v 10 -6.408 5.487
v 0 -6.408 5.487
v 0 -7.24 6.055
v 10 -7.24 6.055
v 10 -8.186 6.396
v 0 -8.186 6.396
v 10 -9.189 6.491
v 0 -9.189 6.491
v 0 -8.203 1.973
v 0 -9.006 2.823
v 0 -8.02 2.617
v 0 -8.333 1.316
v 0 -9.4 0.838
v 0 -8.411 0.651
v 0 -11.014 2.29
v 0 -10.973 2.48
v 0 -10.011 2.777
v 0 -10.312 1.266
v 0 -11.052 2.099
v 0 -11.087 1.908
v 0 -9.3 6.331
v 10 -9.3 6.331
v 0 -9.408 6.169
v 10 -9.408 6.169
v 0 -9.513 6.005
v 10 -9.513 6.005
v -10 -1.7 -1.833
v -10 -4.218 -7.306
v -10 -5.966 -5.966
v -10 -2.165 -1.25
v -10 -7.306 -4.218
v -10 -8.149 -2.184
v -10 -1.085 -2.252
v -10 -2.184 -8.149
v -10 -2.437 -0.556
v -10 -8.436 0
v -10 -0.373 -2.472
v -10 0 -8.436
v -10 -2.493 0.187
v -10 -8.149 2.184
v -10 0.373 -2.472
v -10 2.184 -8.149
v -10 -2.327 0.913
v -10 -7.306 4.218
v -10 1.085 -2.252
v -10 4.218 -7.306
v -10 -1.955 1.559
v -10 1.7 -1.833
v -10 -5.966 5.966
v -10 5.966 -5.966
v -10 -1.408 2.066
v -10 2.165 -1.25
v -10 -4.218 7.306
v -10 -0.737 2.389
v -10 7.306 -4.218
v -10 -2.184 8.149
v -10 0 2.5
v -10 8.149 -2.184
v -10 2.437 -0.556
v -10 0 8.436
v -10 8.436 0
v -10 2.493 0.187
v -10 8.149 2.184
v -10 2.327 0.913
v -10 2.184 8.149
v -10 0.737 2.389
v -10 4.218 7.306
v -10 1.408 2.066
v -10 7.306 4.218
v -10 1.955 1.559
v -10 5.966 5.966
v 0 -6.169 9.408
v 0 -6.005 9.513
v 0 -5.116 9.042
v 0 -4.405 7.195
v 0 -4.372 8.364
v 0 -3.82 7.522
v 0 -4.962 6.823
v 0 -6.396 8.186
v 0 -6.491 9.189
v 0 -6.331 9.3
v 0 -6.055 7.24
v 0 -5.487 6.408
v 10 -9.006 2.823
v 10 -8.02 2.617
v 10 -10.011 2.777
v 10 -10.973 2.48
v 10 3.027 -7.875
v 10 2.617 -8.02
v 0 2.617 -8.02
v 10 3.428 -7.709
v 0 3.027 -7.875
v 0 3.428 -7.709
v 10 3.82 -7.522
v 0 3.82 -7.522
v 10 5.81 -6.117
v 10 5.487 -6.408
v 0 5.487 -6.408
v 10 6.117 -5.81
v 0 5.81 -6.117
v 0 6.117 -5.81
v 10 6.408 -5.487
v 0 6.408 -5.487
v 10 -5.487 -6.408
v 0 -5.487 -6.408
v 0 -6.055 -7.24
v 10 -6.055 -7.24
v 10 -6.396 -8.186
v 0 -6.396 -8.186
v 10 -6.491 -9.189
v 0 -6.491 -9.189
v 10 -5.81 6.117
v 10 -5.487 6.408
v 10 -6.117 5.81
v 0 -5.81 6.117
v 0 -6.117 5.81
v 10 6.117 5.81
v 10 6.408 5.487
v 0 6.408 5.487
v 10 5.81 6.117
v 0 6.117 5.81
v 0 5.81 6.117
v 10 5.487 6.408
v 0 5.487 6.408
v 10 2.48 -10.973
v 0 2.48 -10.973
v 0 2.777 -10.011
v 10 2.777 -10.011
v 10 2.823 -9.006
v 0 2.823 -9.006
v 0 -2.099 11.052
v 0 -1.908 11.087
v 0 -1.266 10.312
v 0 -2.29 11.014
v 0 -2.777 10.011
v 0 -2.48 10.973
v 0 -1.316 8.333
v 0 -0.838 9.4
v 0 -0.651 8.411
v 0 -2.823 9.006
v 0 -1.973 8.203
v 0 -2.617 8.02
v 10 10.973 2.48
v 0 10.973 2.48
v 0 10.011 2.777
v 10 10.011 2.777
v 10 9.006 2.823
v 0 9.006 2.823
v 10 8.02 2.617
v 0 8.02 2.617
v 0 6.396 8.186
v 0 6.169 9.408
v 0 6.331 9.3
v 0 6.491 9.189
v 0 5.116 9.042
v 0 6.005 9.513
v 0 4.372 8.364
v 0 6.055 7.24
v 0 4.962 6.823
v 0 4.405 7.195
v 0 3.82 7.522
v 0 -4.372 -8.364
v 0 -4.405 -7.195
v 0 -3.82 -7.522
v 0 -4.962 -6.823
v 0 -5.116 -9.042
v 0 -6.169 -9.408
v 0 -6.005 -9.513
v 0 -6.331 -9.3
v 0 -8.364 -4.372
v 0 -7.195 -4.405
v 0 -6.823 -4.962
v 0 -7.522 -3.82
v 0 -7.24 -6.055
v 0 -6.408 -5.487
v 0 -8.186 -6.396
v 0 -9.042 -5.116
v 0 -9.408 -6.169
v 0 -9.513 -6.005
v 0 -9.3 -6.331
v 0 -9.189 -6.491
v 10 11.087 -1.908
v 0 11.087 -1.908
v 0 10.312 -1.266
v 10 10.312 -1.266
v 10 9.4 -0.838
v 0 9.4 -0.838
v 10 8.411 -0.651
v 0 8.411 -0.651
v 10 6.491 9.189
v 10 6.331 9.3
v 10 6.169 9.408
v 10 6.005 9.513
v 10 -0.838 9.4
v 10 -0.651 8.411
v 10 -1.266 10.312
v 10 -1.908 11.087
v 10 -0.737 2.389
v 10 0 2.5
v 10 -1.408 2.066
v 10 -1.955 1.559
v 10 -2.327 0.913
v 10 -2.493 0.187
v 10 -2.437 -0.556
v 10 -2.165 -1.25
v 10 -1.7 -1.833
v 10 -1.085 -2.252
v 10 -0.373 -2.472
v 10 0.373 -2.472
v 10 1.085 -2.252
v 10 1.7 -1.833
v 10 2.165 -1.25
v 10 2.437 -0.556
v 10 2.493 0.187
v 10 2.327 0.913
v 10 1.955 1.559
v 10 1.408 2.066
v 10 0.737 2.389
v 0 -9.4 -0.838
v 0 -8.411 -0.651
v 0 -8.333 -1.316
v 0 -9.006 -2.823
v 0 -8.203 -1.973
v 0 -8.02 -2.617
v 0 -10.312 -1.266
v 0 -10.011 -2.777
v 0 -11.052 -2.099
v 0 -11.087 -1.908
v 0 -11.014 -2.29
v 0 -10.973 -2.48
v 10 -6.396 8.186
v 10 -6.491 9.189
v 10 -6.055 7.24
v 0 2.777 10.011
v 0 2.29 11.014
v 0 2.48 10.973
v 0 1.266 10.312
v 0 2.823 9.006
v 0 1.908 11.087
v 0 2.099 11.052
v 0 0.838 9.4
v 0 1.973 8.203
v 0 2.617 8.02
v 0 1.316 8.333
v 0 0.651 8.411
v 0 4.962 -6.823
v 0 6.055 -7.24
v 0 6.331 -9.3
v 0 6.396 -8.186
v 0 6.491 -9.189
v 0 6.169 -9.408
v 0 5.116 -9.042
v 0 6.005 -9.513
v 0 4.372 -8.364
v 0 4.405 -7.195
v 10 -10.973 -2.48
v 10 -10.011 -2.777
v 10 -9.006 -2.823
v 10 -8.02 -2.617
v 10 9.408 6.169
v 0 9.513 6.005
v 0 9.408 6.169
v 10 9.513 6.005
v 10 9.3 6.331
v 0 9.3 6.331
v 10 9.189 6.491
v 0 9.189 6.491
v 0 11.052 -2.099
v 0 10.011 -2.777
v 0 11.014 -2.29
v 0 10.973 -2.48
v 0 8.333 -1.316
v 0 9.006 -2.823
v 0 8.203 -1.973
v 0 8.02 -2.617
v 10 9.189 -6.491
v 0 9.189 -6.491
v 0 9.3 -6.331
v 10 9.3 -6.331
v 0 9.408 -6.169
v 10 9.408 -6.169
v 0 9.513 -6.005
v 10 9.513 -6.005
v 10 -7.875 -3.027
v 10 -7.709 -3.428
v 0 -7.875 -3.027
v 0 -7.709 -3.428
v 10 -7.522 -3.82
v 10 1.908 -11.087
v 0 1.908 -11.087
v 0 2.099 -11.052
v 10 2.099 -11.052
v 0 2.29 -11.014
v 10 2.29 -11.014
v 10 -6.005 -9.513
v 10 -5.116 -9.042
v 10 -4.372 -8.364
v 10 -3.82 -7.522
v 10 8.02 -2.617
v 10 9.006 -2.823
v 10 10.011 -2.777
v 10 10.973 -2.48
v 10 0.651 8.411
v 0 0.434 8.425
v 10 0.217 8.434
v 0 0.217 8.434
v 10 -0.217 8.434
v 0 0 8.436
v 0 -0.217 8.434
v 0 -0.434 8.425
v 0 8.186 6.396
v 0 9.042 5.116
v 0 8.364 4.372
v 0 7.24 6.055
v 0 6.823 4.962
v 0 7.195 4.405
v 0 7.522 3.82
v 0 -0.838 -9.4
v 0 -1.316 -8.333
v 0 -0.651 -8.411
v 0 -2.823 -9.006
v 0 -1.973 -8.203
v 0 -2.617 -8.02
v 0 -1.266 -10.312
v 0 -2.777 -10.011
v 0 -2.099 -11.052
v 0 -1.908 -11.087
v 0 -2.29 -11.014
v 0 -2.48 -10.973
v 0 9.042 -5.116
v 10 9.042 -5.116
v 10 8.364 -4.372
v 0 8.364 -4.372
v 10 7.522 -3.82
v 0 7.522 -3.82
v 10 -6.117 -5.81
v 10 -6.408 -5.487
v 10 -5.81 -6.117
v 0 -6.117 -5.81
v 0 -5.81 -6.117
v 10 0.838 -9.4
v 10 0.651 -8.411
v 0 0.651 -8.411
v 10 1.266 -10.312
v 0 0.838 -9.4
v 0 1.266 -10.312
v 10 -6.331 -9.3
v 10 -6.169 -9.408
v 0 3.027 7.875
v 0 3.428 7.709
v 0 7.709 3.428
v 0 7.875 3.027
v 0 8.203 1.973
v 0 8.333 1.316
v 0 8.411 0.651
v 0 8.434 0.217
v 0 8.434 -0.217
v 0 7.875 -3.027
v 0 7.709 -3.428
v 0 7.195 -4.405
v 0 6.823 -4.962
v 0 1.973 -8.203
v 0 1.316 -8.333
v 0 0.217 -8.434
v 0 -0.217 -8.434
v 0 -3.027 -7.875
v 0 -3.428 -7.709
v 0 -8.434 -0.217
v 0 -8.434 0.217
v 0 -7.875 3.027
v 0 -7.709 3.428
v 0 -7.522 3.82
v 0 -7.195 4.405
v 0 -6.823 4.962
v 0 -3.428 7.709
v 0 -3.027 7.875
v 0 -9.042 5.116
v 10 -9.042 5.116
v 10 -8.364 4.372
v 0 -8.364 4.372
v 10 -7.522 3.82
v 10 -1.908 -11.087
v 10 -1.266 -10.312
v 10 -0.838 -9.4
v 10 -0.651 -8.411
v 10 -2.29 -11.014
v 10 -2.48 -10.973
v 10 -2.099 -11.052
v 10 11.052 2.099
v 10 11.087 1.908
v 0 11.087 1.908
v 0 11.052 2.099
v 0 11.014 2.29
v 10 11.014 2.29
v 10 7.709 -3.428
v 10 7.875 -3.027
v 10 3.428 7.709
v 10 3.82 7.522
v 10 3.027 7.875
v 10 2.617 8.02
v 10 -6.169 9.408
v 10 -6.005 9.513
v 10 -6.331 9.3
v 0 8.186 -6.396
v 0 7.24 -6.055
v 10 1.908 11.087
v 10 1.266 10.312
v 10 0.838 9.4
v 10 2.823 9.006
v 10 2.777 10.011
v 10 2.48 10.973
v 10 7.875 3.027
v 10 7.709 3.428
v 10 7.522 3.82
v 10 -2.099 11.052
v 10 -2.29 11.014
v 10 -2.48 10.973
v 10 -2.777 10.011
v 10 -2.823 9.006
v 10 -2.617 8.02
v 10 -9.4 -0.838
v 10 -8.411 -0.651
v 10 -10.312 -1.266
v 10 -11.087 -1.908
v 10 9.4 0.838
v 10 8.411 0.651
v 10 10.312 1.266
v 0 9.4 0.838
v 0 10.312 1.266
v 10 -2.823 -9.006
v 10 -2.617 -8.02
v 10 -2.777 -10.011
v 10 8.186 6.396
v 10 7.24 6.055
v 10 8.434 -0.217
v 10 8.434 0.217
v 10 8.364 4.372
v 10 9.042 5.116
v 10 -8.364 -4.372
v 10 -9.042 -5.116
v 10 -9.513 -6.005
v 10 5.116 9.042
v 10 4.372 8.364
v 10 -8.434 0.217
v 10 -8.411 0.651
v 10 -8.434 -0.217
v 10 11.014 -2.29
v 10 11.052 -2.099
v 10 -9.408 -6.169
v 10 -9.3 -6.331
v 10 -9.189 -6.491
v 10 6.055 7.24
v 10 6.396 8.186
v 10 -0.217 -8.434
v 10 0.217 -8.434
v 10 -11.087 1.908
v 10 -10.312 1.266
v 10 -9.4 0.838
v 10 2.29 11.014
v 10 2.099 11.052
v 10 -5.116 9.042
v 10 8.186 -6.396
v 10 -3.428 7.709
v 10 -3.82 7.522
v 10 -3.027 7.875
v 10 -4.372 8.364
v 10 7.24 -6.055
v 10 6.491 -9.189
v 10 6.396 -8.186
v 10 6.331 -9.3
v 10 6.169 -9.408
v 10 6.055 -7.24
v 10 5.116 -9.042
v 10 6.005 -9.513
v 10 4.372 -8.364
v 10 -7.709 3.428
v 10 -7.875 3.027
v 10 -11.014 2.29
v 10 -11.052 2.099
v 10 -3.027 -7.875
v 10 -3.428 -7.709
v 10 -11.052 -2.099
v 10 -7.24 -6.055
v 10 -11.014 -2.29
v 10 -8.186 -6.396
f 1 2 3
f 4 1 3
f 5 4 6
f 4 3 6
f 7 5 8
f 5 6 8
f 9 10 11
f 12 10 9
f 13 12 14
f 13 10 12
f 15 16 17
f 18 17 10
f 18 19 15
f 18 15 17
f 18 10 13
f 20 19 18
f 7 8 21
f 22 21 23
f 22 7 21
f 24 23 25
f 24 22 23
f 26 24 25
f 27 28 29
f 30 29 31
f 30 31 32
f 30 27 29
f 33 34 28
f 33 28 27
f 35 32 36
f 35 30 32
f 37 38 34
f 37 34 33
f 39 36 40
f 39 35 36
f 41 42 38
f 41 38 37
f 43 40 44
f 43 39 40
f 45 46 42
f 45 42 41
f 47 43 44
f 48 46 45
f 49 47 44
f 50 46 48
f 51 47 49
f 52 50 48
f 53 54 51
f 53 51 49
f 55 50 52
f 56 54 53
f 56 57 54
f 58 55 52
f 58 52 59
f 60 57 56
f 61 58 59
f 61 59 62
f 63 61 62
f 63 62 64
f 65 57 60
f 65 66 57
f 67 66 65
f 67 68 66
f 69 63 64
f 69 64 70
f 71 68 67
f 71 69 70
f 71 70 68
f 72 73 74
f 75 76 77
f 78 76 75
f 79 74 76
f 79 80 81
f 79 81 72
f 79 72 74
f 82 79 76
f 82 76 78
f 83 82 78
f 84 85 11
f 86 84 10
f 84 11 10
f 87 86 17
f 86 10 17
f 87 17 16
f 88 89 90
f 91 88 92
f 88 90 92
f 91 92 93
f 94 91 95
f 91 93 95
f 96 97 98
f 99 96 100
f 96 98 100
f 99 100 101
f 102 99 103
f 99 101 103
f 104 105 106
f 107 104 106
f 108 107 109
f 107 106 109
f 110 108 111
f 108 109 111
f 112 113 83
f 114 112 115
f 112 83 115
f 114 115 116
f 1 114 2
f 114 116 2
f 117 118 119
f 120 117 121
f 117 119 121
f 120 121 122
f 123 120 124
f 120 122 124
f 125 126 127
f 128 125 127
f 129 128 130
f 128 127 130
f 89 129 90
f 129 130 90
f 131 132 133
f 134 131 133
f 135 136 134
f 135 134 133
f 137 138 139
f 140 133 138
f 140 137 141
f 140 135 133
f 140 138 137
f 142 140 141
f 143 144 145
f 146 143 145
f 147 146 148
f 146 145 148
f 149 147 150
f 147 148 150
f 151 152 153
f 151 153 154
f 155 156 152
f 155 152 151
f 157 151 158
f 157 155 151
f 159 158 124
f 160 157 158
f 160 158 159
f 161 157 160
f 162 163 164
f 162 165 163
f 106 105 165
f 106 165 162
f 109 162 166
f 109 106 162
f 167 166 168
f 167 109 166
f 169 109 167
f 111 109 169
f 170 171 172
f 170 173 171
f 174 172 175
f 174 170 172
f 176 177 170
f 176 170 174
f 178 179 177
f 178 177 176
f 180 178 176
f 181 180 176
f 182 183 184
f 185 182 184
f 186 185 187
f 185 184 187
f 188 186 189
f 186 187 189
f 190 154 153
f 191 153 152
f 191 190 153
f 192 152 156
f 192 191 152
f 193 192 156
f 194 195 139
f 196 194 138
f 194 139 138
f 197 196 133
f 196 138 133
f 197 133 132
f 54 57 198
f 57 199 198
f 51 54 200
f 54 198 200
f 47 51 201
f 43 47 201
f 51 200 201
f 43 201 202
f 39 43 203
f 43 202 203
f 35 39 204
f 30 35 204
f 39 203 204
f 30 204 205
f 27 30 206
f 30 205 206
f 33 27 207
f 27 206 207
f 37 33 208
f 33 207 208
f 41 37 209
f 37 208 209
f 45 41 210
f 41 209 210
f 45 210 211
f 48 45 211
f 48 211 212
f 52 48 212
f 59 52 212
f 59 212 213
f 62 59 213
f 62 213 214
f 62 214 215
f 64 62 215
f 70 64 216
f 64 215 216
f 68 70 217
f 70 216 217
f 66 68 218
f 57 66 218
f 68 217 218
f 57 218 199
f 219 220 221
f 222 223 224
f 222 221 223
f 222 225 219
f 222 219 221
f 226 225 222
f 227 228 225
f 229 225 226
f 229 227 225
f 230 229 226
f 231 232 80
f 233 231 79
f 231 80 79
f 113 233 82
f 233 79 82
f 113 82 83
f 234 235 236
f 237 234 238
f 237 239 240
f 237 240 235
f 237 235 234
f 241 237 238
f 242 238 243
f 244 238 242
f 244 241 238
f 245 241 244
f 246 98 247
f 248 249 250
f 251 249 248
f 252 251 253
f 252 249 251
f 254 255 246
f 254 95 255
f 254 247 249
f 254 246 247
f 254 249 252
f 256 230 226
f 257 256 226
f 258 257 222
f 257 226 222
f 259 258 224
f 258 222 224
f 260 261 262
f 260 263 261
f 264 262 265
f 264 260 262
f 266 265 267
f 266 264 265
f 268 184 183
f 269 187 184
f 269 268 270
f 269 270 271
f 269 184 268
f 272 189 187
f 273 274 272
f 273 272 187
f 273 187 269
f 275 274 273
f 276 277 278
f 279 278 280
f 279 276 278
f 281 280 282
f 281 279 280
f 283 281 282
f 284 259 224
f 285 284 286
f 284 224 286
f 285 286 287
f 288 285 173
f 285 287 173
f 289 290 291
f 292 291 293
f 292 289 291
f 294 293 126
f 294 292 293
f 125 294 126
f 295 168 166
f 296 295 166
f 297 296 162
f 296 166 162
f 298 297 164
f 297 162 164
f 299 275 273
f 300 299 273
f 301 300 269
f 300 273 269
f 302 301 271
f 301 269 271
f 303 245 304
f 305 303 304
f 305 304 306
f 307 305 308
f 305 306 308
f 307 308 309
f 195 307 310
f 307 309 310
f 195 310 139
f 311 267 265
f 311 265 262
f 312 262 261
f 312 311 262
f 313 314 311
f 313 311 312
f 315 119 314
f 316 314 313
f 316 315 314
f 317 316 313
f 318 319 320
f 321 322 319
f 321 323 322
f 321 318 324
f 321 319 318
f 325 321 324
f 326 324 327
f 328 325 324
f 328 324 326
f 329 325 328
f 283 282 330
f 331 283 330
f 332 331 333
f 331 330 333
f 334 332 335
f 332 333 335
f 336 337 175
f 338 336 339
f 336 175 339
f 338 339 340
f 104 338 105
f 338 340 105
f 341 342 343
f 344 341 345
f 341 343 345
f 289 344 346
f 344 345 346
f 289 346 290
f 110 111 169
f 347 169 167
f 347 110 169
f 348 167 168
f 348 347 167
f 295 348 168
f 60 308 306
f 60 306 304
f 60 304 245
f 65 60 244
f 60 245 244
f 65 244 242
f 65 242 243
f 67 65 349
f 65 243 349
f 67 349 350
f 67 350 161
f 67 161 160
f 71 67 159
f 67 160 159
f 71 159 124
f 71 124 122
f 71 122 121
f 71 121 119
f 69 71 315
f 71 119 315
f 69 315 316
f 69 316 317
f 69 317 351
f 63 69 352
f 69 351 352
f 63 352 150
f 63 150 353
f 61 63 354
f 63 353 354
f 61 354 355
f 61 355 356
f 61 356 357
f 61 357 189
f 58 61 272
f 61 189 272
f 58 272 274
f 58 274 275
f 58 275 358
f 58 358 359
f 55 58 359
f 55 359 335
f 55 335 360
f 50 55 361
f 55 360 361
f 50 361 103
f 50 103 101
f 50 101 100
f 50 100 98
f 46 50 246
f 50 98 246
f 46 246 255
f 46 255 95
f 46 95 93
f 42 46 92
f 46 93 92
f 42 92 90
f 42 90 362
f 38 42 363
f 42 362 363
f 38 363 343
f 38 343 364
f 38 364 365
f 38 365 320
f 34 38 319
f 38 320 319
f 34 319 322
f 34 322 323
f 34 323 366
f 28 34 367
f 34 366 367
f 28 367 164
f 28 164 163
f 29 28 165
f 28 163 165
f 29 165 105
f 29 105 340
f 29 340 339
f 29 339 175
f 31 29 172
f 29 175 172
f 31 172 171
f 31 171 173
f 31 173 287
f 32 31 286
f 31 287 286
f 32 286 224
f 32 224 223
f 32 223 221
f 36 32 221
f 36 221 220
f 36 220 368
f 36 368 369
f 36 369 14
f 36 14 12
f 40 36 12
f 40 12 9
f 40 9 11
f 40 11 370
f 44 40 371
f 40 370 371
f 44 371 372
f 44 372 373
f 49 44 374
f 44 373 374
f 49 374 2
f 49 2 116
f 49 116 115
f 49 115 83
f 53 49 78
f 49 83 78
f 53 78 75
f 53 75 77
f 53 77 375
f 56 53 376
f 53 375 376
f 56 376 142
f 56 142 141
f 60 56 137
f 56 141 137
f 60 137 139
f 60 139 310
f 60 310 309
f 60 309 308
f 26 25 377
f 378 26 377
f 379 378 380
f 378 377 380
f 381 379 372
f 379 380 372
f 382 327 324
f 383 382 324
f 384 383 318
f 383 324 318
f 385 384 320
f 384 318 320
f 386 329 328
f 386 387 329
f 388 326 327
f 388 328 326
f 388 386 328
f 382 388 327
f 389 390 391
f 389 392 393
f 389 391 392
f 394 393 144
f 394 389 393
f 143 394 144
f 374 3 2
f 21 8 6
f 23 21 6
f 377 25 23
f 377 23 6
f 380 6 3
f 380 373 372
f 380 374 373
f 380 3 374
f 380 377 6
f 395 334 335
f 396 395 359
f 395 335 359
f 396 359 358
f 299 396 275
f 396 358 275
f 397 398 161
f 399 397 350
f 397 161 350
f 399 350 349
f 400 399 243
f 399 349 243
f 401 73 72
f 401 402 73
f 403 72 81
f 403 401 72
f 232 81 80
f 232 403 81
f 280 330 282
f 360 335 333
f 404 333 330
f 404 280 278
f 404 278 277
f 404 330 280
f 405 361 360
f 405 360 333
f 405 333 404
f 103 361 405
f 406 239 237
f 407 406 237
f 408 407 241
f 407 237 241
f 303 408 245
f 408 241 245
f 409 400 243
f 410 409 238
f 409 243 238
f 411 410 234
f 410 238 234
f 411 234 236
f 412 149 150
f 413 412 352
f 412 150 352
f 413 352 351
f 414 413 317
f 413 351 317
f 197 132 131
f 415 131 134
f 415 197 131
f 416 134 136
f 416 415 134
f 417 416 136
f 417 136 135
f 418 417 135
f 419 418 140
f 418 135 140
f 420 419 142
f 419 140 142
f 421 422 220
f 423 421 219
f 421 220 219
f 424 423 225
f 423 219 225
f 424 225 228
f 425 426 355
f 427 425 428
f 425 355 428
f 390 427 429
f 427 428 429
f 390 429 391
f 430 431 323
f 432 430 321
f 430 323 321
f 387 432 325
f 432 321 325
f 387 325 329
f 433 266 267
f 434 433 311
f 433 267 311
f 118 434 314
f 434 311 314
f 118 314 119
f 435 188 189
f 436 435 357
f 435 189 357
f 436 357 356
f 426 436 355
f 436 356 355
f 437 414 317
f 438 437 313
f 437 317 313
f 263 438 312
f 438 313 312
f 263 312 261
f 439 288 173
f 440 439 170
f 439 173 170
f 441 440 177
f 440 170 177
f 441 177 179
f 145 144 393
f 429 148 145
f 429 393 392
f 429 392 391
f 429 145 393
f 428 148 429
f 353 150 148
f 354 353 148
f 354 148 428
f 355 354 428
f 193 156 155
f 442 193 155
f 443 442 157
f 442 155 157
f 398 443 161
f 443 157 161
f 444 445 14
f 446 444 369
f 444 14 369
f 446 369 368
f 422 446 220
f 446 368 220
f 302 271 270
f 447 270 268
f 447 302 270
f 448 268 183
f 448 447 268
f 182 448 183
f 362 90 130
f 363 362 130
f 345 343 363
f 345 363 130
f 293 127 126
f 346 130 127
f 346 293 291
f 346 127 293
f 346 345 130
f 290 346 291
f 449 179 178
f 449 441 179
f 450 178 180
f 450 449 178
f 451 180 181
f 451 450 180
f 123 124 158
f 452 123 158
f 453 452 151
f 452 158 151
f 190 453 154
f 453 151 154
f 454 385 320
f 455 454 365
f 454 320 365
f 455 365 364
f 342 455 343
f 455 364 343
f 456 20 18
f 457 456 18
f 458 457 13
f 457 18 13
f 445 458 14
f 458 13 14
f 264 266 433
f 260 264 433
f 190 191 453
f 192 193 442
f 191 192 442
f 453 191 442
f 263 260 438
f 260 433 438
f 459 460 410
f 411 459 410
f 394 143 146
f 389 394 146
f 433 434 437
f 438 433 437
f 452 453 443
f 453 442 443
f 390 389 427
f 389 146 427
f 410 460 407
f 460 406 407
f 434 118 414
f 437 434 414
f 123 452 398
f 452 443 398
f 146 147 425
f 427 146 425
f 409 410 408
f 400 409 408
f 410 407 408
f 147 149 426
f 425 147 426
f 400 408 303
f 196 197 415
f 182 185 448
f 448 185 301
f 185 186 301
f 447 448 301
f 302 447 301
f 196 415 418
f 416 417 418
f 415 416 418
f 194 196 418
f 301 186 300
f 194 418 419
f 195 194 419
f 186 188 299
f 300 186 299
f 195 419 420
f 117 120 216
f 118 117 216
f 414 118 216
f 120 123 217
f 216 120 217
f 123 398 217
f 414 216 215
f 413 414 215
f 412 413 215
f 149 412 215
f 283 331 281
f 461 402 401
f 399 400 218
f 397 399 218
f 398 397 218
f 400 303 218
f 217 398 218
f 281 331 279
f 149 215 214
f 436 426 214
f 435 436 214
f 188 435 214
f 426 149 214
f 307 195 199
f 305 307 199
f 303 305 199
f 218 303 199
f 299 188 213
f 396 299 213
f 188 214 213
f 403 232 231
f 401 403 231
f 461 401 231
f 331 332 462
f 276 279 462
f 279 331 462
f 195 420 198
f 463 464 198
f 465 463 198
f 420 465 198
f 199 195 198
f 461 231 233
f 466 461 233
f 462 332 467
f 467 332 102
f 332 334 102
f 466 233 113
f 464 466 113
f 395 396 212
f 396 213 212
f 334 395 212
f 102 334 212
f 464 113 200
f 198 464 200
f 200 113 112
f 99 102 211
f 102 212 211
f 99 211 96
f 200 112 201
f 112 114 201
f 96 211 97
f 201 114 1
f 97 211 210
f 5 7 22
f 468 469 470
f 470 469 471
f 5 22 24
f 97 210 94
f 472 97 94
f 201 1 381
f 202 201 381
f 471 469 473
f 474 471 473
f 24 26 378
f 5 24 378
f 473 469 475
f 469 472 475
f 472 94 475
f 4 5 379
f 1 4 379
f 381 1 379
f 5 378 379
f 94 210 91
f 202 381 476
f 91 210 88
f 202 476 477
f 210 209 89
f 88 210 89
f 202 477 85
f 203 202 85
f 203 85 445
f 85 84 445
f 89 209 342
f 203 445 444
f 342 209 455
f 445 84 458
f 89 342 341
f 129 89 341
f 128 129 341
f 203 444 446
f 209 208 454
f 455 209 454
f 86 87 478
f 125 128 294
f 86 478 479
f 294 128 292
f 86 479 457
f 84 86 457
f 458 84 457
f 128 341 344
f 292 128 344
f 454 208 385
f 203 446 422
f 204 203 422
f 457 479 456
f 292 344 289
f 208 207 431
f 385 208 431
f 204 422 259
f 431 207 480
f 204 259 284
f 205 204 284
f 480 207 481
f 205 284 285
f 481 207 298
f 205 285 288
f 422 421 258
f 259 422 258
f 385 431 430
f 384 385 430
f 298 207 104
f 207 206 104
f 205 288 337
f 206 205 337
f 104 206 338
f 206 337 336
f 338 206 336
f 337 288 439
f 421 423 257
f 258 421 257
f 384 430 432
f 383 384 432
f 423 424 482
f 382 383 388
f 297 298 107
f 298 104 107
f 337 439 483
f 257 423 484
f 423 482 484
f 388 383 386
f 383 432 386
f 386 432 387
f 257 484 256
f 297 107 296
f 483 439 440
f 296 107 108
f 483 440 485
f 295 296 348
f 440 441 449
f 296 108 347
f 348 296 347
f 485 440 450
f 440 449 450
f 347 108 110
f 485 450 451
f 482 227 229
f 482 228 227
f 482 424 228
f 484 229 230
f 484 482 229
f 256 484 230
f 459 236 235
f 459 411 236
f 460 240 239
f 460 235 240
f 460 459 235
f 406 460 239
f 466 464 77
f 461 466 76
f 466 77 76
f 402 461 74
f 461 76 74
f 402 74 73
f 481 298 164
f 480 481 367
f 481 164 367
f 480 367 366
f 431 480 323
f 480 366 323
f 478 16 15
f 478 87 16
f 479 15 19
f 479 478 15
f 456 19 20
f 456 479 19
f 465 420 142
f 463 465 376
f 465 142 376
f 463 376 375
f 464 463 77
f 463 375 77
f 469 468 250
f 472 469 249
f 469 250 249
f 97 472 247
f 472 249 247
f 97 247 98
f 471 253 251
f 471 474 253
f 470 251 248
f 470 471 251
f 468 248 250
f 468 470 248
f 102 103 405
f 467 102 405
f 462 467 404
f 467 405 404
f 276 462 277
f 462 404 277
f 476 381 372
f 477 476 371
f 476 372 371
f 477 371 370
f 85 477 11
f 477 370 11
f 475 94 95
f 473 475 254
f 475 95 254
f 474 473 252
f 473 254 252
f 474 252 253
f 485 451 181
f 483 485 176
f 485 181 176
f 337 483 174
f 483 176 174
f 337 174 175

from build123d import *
from build123d.topology import SkipClean

# Parameters (mm, degrees)
BASPROSKE_W      = 10
BASPROSKE_H      = 11.25
TOOTHCUT_DEPTH   = 19.791620473
TEETHCUTS_COUNT  = 16
TEETHCUTS_ANGLE  = 337.5
HUBNEAONESKE_R   = 8.4365
HUBNEARONE_DEPTH = 10.0000508
BORSKE_R         = 2.5
BORE_DEPTH       = 20.0000508


with BuildPart() as part:
    # BasProSke → Base-Revolve (revolve)
    with BuildSketch(Plane(origin=(0, 0, 0), x_dir=(1, 0, 0), z_dir=(0, 1, 0)), mode=Mode.PRIVATE) as base_revolve_sk:
        with Locations((5, 5.625)):
            Rectangle(BASPROSKE_W, BASPROSKE_H)
    revolve(base_revolve_sk.sketch.rotate(Axis((-10, 0, 0), (1, 0, 0)), 180), axis=Axis((-10, 0, 0), (1, 0, 0)))

    # TooCutSke → ToothCut (cut, through all)
    with BuildSketch(Plane(origin=(0, 0, 0), x_dir=(0, 0, -1), z_dir=(1, 0, 0))):
        with BuildLine():
            ThreePointArc((0.651061533, 8.411340626), (0, 8.4365), (-0.651061533, 8.411340626))
            ThreePointArc((-0.651061533, 8.411340626), (-1.029874156, 9.883978829), (-1.930926138, 11.108832945))
            ThreePointArc((-1.930926138, 11.108832945), (0, 11.2754), (1.930926138, 11.108832945))
            ThreePointArc((1.930926138, 11.108832945), (1.029874156, 9.883978829), (0.651061533, 8.411340626))
        make_face()
    toothcut = extrude(amount=TOOTHCUT_DEPTH, mode=Mode.SUBTRACT)

    # TeethCuts: ToothCut ×16 about axis
    teethcuts_axis = Axis((-10, 0, 0), (1, 0, 0))
    for i in range(1, TEETHCUTS_COUNT):
        add(toothcut.rotate(teethcuts_axis, i * TEETHCUTS_ANGLE / (TEETHCUTS_COUNT - 1)), mode=Mode.SUBTRACT)

    # HubNeaOneSke → HubNearOne (add)
    with SkipClean():  # the faces are left unmerged after this step: merging them gives an invalid solid
        with BuildSketch(Plane.ZY):
            Circle(HUBNEAONESKE_R)
        extrude(amount=HUBNEARONE_DEPTH)

    # BorSke → Bore (cut, symmetric)
    with SkipClean():  # the faces are left unmerged after this step: merging them gives an invalid solid
        with BuildSketch(Plane(origin=(0, 0, 0), x_dir=(0, 0, -1), z_dir=(1, 0, 0))):
            with Locations(Location((0, 0, 0), (0, 0, 180))):
                Circle(BORSKE_R)
        extrude(amount=BORE_DEPTH, both=True, mode=Mode.SUBTRACT)


solid = part.part
